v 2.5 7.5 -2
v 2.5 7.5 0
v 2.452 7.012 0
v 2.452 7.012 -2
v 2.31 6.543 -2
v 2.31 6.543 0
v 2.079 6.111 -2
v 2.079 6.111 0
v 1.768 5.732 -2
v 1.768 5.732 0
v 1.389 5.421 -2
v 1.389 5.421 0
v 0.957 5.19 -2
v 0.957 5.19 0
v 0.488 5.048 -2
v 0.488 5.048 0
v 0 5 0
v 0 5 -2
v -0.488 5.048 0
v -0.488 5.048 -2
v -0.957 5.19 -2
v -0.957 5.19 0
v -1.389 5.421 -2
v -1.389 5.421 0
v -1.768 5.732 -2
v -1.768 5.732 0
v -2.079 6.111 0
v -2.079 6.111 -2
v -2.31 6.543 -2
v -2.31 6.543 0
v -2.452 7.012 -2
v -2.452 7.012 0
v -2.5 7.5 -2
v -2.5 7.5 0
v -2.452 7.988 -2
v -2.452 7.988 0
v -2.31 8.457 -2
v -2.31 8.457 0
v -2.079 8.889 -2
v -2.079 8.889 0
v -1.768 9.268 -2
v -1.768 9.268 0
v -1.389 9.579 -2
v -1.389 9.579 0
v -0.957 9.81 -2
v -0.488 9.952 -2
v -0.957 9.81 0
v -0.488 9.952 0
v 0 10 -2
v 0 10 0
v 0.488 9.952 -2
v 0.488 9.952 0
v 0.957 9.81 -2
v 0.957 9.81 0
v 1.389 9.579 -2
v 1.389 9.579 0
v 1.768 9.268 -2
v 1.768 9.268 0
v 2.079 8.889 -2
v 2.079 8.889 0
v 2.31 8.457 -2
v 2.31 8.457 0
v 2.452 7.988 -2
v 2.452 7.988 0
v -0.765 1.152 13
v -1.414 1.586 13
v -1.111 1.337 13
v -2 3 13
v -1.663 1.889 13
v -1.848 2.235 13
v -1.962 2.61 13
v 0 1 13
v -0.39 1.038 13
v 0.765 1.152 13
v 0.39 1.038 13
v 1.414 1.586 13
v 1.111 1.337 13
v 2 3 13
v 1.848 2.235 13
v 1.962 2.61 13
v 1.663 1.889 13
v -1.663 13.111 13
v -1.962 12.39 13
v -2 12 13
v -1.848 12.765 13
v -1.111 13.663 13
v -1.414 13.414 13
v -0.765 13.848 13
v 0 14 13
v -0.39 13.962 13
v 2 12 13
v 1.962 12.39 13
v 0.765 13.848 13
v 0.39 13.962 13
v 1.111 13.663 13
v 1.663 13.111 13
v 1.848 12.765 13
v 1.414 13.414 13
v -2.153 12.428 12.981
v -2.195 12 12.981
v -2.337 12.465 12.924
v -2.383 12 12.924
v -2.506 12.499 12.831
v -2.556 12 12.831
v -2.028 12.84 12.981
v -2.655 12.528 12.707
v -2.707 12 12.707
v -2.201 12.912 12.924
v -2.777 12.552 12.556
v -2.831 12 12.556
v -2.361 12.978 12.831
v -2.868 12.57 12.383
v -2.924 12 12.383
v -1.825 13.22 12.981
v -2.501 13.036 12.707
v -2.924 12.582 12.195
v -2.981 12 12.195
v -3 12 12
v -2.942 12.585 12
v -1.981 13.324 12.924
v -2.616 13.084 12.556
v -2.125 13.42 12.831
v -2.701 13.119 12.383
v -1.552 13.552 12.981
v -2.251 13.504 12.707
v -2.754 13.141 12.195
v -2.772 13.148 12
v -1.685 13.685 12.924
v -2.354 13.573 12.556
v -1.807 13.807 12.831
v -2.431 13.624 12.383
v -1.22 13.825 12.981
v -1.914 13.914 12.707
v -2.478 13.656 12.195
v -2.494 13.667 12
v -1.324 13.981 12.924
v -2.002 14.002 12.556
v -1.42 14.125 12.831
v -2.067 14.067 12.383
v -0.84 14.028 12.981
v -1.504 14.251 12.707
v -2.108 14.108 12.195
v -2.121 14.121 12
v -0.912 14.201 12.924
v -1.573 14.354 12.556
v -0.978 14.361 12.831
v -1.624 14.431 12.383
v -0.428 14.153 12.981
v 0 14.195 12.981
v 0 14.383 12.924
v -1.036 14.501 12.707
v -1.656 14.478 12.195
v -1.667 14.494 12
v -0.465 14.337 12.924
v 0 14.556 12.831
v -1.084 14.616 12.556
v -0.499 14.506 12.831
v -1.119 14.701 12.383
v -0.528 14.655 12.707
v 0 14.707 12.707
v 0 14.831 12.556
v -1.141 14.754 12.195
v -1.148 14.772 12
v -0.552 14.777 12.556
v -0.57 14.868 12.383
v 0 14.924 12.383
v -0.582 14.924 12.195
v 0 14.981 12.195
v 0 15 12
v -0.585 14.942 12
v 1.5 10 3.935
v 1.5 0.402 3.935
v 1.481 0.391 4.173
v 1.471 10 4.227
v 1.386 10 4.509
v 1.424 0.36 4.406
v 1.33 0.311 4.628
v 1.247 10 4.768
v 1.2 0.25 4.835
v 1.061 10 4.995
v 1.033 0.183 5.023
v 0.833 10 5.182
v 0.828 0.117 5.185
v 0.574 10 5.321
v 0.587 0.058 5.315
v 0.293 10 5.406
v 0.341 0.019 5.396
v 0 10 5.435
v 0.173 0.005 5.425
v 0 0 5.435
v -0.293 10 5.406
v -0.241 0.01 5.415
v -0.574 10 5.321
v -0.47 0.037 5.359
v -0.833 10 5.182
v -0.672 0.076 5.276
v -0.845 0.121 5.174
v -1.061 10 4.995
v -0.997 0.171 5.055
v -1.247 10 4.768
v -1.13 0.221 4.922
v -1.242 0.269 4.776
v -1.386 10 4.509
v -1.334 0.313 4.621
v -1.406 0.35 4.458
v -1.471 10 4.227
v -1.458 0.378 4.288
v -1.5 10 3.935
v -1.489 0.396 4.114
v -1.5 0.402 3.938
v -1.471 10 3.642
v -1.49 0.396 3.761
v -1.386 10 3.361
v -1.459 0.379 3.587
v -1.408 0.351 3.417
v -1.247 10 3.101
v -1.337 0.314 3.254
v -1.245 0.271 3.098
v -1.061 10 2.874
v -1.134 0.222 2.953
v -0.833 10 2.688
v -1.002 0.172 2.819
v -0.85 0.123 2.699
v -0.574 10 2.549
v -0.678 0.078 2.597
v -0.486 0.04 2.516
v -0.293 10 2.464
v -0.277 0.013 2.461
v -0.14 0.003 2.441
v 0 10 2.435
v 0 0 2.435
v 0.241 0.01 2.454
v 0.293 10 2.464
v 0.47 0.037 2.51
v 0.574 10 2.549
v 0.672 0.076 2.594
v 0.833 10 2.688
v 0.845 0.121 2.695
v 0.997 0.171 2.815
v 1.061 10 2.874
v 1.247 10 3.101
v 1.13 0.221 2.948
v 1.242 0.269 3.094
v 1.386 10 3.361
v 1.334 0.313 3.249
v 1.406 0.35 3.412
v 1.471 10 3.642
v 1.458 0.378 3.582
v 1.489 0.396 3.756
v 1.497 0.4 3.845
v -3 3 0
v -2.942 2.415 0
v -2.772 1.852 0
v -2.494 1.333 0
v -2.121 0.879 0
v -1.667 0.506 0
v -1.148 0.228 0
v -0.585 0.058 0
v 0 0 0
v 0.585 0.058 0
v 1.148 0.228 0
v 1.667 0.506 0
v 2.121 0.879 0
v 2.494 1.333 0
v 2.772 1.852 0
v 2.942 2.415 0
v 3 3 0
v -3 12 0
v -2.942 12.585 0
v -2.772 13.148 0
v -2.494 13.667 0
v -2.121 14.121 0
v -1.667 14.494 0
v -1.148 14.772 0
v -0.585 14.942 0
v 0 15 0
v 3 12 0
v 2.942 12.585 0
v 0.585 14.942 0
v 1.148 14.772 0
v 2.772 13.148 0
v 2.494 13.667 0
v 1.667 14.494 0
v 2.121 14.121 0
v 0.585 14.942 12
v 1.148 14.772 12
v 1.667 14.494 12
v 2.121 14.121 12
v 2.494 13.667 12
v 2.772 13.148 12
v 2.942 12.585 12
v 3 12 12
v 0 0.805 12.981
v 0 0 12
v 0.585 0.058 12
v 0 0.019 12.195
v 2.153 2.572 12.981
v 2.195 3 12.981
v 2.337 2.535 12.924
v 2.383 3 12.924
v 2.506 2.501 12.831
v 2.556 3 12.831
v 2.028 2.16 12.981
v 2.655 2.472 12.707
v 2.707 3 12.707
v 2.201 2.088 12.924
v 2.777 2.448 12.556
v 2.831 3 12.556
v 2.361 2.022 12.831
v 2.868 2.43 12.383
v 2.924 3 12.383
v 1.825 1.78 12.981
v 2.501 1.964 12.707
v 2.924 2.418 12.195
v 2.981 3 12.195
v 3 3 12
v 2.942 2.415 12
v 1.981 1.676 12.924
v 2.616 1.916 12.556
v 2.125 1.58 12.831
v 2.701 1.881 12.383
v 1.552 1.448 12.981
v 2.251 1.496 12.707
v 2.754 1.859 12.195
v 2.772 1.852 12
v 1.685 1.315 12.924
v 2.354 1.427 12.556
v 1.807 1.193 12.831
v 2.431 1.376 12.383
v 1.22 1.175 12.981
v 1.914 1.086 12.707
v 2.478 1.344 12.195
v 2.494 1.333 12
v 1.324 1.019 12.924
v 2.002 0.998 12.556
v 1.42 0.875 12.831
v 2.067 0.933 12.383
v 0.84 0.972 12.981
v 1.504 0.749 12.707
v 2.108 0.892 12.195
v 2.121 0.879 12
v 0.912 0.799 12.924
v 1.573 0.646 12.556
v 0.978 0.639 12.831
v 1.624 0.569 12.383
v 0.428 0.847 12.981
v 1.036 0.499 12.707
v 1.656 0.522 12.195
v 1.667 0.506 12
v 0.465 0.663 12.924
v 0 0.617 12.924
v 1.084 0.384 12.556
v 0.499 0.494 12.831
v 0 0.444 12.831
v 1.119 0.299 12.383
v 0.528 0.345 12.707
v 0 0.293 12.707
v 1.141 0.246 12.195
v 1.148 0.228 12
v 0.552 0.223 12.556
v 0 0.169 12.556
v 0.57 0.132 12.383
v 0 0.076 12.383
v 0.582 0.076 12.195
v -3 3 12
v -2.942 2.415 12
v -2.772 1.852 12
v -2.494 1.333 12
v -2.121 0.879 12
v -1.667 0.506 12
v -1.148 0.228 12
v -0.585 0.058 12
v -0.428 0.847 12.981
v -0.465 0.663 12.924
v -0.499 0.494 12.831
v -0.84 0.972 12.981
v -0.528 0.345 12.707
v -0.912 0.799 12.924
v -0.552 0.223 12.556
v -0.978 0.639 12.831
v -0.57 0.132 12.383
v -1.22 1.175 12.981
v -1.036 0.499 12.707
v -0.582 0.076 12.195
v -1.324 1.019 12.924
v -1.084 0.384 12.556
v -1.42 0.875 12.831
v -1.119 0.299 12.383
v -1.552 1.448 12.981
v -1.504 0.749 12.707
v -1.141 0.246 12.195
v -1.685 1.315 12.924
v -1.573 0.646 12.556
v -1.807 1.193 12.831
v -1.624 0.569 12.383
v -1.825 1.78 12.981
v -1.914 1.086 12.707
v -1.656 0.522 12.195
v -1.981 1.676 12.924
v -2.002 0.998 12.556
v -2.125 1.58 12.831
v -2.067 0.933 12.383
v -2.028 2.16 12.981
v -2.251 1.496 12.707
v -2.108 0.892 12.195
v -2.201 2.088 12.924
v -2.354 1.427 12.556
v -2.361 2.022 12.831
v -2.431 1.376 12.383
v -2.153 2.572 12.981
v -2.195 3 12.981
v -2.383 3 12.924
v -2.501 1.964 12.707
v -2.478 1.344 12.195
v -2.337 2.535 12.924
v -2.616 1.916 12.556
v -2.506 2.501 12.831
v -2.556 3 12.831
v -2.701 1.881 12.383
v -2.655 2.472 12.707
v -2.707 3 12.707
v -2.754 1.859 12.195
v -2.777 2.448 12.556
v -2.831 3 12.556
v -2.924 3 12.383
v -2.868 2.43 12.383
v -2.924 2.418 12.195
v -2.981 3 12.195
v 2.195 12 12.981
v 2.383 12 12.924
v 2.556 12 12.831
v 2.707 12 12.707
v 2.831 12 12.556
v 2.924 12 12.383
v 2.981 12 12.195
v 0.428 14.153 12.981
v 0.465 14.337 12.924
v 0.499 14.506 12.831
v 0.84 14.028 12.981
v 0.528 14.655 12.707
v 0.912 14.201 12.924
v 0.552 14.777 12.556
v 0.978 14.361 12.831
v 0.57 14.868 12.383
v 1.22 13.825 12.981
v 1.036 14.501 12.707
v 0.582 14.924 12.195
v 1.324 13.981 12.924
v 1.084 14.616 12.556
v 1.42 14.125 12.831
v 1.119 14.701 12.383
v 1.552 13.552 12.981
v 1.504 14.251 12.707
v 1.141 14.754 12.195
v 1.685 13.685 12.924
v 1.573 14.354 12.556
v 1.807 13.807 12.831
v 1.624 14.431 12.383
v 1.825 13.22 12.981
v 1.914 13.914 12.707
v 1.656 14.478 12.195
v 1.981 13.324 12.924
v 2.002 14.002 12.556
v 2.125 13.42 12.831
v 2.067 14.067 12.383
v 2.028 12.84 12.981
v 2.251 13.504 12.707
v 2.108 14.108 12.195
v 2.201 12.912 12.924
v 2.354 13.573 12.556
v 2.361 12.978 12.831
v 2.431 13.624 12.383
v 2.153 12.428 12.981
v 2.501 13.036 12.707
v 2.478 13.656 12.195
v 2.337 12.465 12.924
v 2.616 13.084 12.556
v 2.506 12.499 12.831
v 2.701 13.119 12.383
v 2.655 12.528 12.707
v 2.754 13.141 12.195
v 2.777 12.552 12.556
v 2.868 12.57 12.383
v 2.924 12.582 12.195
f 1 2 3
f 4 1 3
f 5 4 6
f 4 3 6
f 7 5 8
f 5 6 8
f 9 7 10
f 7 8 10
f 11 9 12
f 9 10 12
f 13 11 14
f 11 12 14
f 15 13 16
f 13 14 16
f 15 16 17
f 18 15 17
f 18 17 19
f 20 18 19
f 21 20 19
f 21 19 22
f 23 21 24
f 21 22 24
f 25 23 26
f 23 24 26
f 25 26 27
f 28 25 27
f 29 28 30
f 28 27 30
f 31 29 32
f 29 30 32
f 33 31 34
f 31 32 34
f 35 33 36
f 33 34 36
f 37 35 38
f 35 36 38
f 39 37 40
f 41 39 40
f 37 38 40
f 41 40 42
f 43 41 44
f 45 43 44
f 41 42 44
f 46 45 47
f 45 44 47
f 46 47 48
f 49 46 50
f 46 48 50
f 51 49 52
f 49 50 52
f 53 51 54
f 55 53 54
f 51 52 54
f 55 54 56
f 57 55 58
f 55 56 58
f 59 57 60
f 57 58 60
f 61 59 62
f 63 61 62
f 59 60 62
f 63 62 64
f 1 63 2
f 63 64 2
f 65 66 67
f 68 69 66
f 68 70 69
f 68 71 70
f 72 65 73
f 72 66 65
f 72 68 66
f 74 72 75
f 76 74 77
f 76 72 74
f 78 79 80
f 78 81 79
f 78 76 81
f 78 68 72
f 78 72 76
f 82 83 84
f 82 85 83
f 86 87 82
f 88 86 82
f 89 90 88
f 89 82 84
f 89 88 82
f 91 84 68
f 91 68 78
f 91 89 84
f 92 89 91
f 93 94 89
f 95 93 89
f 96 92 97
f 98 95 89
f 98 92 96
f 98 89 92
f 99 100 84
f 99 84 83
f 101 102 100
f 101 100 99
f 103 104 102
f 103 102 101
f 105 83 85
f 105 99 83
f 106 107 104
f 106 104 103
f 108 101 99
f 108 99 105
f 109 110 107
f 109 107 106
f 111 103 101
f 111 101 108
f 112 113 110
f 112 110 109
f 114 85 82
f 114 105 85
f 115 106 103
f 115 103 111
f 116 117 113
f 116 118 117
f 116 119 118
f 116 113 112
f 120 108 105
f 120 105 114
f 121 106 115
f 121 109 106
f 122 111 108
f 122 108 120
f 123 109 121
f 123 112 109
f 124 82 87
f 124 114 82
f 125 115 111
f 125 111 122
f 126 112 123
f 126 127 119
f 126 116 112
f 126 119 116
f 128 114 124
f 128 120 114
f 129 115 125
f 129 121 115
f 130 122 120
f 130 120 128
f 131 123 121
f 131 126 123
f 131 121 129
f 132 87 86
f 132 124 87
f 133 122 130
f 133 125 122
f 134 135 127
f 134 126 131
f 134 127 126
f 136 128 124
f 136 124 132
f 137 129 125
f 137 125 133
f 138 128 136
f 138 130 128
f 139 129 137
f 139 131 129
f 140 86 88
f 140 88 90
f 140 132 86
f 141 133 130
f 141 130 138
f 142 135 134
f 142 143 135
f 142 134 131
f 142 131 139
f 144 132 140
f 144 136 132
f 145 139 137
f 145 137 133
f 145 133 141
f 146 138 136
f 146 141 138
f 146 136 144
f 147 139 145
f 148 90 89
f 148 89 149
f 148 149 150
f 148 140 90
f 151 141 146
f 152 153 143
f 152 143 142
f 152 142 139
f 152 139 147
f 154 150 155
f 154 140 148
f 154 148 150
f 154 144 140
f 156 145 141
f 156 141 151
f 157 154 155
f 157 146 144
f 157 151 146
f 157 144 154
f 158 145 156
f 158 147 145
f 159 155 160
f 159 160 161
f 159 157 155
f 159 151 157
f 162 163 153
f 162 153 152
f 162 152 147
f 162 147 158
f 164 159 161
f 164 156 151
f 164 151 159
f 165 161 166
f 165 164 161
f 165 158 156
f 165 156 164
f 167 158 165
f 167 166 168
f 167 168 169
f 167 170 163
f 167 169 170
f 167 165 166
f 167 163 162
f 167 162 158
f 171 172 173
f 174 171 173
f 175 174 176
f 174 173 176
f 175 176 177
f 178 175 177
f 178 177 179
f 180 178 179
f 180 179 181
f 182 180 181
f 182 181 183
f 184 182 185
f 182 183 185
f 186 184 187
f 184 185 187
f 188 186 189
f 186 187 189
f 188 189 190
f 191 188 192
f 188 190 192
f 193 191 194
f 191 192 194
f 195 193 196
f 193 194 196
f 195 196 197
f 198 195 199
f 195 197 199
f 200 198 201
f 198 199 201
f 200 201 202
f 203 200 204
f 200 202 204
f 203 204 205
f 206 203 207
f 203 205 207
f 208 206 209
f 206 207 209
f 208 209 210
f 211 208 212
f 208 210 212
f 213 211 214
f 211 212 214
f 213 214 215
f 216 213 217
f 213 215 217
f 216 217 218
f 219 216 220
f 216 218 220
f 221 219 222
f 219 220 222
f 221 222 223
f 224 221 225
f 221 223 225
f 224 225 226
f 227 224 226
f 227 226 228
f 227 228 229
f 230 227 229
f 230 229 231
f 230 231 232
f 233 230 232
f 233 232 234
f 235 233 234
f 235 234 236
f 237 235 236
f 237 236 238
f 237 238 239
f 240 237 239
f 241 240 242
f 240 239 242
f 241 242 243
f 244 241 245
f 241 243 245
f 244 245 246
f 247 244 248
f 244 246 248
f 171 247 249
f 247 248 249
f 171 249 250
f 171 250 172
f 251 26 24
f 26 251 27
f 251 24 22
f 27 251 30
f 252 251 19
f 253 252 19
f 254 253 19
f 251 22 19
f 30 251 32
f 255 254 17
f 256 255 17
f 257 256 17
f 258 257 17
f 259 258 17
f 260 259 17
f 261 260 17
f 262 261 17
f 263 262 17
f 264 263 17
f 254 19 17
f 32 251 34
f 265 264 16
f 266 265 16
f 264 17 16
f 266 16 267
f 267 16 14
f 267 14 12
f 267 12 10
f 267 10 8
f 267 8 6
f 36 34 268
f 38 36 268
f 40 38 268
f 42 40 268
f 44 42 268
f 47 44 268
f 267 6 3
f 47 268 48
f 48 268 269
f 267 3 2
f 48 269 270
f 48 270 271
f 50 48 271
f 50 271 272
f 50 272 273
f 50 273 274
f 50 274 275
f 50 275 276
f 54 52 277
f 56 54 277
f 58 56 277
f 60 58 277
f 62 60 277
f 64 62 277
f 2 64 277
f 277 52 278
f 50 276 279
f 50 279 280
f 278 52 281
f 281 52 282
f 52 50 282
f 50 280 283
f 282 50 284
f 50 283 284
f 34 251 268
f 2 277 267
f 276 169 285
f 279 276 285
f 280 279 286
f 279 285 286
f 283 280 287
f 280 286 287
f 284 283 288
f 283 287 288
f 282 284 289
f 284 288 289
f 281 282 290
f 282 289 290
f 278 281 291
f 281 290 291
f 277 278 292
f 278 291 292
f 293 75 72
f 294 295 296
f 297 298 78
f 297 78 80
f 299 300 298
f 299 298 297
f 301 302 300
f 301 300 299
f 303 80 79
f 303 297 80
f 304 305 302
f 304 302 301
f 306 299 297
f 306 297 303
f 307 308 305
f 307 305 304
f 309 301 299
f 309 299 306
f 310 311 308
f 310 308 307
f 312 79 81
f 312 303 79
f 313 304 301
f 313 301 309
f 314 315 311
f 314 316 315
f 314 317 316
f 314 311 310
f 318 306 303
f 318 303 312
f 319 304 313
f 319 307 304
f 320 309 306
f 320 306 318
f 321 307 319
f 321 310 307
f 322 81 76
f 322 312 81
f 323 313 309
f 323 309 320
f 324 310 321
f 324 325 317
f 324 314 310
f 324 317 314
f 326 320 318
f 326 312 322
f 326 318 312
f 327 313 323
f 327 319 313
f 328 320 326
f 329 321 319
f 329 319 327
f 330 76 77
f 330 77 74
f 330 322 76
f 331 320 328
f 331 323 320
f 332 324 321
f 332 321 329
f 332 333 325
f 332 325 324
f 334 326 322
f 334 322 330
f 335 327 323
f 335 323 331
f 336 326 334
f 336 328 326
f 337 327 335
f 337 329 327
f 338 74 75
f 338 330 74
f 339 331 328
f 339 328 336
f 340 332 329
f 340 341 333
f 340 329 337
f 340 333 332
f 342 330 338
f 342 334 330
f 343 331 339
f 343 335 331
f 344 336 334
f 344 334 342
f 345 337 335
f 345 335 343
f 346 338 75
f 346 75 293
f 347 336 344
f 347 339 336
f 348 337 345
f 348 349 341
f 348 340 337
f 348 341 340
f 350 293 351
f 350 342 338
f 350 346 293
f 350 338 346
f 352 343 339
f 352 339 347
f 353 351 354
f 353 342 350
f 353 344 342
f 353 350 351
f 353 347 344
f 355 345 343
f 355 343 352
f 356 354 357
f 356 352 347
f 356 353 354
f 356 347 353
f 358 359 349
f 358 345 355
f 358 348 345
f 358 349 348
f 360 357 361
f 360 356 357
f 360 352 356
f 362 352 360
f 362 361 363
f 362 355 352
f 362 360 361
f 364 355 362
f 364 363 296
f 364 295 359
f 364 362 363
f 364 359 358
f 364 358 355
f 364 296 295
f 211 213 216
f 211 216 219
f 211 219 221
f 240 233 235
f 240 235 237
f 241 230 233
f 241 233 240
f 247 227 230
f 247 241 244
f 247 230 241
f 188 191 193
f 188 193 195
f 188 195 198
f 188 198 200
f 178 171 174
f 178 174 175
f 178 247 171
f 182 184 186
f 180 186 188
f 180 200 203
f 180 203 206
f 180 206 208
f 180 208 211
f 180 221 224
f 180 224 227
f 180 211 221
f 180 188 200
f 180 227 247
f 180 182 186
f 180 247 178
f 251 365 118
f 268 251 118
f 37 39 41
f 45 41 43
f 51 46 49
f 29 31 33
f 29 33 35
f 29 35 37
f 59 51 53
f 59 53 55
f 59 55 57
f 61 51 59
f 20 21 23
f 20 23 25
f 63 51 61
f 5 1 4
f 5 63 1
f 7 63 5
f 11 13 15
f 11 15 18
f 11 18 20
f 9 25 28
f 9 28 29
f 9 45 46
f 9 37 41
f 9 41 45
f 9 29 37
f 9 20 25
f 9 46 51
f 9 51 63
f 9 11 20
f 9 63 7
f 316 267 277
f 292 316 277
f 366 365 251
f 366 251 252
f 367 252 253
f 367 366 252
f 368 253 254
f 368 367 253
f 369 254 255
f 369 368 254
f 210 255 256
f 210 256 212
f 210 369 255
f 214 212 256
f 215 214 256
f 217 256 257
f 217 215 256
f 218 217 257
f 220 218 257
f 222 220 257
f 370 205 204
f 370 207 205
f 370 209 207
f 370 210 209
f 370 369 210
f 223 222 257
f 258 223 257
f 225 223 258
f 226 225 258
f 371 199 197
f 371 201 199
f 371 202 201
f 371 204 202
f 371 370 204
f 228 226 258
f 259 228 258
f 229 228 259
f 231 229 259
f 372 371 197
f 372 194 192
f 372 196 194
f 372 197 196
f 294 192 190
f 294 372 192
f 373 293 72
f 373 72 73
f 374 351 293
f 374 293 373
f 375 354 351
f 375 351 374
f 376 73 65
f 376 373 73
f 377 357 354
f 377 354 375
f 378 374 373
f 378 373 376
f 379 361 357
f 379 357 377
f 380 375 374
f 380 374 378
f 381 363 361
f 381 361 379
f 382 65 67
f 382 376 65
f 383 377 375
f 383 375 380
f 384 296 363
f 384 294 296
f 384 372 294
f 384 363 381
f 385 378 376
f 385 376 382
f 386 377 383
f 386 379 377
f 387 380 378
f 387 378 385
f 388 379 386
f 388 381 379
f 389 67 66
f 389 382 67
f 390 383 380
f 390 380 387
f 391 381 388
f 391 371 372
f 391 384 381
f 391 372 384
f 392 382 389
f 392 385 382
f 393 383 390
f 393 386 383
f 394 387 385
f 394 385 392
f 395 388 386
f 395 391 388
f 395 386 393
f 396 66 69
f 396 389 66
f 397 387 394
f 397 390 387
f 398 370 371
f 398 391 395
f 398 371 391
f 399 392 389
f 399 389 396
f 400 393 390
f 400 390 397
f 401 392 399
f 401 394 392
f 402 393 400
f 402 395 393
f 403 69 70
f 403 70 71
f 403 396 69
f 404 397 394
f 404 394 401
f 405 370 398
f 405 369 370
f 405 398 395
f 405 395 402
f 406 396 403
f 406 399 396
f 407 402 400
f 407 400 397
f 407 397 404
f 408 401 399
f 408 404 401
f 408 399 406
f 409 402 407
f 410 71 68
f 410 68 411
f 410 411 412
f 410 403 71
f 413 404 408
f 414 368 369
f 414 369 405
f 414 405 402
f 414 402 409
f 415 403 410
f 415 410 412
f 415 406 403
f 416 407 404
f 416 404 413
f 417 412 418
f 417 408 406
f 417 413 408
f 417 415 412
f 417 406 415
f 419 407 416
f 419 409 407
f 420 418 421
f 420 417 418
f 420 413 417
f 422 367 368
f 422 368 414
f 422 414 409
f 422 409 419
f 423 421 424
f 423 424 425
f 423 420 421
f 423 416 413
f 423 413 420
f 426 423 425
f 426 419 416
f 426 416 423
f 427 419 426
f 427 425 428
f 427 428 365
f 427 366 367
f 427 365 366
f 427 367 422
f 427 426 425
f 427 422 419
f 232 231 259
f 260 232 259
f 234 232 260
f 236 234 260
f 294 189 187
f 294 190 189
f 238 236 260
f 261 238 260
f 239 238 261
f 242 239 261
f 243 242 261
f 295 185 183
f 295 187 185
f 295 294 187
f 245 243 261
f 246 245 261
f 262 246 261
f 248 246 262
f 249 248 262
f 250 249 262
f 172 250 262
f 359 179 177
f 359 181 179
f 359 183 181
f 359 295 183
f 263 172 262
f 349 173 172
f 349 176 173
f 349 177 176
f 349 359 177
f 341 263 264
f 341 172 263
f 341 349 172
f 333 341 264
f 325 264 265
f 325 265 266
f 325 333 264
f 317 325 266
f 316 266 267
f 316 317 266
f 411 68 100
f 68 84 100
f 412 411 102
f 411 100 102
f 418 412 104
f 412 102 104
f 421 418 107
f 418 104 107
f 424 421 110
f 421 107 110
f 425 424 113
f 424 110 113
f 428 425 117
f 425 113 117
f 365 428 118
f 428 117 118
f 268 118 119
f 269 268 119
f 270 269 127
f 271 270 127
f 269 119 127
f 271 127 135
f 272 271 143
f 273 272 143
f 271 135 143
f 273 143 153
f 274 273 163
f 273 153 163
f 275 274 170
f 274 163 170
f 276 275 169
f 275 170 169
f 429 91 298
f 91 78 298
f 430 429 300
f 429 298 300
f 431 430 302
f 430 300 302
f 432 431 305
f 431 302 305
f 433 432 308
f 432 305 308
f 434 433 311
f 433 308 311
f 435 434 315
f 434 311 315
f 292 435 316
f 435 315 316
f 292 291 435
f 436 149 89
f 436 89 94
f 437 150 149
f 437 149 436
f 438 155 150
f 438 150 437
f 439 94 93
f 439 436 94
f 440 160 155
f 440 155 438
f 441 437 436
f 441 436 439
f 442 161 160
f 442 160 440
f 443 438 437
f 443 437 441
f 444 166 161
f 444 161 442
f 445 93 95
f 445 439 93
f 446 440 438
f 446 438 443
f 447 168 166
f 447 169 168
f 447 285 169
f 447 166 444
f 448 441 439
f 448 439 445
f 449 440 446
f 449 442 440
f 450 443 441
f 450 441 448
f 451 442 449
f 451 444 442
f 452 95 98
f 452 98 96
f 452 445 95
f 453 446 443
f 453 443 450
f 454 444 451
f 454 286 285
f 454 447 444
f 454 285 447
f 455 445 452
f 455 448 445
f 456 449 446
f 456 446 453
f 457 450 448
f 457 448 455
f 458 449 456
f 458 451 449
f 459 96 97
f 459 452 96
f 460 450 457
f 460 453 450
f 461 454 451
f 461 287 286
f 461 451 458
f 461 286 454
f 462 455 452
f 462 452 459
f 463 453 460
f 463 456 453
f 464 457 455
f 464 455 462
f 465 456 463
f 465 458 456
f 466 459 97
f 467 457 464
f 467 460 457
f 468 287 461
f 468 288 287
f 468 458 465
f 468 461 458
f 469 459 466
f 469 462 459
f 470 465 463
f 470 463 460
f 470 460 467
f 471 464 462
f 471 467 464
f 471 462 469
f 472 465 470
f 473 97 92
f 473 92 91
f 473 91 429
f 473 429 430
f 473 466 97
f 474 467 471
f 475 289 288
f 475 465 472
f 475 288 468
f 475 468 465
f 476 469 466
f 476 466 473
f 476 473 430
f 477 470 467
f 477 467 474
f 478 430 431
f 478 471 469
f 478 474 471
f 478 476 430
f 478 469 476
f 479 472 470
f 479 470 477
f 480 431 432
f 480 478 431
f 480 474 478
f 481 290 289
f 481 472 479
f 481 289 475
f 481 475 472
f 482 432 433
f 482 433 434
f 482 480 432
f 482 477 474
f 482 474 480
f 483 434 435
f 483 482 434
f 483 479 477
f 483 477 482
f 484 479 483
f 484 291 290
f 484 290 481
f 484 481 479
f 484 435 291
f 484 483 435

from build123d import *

# Parameters (mm, degrees)
F0_W     = 6
F0_H     = 15
F1_DEPTH = 13
F3_DEPTH = 2
F4_R     = 2.99999
F5_R     = 1
F6_R     = 1.5
F7_DEPTH = 10


# Not quite as in the source:
# - a fillet or chamfer is up to 0.001 mm smaller than in the source, because OpenCascade refuses the exact size


with BuildPart() as f1:
    # F0 (on Top) → F1 (new body)
    with BuildSketch(Plane.XY):
        with Locations((0, 7.5)):
            Rectangle(F0_W, F0_H)
    extrude(amount=F1_DEPTH)

    # F2 (on face) → F3 (join)
    with BuildSketch(Plane(origin=(0, 0, 0), x_dir=(1, 0, 0), z_dir=(0, 0, -1))):
        with BuildLine():
            ThreePointArc((-2.5, -7.5), (0, -10), (2.5, -7.5))
            Line((2.5, -7.5), (-2.5, -7.5))
        make_face()
        with BuildLine():
            Line((-2.5, -7.5), (2.5, -7.5))
            ThreePointArc((2.5, -7.5), (0, -5), (-2.5, -7.5))
        make_face()
    extrude(amount=F3_DEPTH)

    # F4 (radius 3 in the source; OpenCascade refuses exactly that, so slightly less here)
    f4_edges = [f1.edges().sort_by_distance(p)[0] for p in [
        (-3, 0, 6.5),
        (3, 0, 6.5),
        (3, 15, 6.5),
        (-3, 15, 6.5),
    ]]
    fillet(f4_edges, radius=F4_R)

    # F5
    f5_edges = [f1.edges().sort_by_distance(p)[0] for p in [
        (0, 15, 13),
        (2.121323, 14.121323, 13),
        (-2.121323, 14.121323, 13),
        (3, 7.5, 13),
        (-3, 7.5, 13),
        (2.121323, 0.878677, 13),
        (-2.121323, 0.878677, 13),
        (0, 0, 13),
    ]]
    fillet(f5_edges, radius=F5_R)

    # F6 (on Front) → F7 (cut)
    with BuildSketch(Plane.XZ):
        with Locations((0, 3.9348333655)):
            Circle(F6_R)
    extrude(amount=-F7_DEPTH, mode=Mode.SUBTRACT)


solid = f1.part
